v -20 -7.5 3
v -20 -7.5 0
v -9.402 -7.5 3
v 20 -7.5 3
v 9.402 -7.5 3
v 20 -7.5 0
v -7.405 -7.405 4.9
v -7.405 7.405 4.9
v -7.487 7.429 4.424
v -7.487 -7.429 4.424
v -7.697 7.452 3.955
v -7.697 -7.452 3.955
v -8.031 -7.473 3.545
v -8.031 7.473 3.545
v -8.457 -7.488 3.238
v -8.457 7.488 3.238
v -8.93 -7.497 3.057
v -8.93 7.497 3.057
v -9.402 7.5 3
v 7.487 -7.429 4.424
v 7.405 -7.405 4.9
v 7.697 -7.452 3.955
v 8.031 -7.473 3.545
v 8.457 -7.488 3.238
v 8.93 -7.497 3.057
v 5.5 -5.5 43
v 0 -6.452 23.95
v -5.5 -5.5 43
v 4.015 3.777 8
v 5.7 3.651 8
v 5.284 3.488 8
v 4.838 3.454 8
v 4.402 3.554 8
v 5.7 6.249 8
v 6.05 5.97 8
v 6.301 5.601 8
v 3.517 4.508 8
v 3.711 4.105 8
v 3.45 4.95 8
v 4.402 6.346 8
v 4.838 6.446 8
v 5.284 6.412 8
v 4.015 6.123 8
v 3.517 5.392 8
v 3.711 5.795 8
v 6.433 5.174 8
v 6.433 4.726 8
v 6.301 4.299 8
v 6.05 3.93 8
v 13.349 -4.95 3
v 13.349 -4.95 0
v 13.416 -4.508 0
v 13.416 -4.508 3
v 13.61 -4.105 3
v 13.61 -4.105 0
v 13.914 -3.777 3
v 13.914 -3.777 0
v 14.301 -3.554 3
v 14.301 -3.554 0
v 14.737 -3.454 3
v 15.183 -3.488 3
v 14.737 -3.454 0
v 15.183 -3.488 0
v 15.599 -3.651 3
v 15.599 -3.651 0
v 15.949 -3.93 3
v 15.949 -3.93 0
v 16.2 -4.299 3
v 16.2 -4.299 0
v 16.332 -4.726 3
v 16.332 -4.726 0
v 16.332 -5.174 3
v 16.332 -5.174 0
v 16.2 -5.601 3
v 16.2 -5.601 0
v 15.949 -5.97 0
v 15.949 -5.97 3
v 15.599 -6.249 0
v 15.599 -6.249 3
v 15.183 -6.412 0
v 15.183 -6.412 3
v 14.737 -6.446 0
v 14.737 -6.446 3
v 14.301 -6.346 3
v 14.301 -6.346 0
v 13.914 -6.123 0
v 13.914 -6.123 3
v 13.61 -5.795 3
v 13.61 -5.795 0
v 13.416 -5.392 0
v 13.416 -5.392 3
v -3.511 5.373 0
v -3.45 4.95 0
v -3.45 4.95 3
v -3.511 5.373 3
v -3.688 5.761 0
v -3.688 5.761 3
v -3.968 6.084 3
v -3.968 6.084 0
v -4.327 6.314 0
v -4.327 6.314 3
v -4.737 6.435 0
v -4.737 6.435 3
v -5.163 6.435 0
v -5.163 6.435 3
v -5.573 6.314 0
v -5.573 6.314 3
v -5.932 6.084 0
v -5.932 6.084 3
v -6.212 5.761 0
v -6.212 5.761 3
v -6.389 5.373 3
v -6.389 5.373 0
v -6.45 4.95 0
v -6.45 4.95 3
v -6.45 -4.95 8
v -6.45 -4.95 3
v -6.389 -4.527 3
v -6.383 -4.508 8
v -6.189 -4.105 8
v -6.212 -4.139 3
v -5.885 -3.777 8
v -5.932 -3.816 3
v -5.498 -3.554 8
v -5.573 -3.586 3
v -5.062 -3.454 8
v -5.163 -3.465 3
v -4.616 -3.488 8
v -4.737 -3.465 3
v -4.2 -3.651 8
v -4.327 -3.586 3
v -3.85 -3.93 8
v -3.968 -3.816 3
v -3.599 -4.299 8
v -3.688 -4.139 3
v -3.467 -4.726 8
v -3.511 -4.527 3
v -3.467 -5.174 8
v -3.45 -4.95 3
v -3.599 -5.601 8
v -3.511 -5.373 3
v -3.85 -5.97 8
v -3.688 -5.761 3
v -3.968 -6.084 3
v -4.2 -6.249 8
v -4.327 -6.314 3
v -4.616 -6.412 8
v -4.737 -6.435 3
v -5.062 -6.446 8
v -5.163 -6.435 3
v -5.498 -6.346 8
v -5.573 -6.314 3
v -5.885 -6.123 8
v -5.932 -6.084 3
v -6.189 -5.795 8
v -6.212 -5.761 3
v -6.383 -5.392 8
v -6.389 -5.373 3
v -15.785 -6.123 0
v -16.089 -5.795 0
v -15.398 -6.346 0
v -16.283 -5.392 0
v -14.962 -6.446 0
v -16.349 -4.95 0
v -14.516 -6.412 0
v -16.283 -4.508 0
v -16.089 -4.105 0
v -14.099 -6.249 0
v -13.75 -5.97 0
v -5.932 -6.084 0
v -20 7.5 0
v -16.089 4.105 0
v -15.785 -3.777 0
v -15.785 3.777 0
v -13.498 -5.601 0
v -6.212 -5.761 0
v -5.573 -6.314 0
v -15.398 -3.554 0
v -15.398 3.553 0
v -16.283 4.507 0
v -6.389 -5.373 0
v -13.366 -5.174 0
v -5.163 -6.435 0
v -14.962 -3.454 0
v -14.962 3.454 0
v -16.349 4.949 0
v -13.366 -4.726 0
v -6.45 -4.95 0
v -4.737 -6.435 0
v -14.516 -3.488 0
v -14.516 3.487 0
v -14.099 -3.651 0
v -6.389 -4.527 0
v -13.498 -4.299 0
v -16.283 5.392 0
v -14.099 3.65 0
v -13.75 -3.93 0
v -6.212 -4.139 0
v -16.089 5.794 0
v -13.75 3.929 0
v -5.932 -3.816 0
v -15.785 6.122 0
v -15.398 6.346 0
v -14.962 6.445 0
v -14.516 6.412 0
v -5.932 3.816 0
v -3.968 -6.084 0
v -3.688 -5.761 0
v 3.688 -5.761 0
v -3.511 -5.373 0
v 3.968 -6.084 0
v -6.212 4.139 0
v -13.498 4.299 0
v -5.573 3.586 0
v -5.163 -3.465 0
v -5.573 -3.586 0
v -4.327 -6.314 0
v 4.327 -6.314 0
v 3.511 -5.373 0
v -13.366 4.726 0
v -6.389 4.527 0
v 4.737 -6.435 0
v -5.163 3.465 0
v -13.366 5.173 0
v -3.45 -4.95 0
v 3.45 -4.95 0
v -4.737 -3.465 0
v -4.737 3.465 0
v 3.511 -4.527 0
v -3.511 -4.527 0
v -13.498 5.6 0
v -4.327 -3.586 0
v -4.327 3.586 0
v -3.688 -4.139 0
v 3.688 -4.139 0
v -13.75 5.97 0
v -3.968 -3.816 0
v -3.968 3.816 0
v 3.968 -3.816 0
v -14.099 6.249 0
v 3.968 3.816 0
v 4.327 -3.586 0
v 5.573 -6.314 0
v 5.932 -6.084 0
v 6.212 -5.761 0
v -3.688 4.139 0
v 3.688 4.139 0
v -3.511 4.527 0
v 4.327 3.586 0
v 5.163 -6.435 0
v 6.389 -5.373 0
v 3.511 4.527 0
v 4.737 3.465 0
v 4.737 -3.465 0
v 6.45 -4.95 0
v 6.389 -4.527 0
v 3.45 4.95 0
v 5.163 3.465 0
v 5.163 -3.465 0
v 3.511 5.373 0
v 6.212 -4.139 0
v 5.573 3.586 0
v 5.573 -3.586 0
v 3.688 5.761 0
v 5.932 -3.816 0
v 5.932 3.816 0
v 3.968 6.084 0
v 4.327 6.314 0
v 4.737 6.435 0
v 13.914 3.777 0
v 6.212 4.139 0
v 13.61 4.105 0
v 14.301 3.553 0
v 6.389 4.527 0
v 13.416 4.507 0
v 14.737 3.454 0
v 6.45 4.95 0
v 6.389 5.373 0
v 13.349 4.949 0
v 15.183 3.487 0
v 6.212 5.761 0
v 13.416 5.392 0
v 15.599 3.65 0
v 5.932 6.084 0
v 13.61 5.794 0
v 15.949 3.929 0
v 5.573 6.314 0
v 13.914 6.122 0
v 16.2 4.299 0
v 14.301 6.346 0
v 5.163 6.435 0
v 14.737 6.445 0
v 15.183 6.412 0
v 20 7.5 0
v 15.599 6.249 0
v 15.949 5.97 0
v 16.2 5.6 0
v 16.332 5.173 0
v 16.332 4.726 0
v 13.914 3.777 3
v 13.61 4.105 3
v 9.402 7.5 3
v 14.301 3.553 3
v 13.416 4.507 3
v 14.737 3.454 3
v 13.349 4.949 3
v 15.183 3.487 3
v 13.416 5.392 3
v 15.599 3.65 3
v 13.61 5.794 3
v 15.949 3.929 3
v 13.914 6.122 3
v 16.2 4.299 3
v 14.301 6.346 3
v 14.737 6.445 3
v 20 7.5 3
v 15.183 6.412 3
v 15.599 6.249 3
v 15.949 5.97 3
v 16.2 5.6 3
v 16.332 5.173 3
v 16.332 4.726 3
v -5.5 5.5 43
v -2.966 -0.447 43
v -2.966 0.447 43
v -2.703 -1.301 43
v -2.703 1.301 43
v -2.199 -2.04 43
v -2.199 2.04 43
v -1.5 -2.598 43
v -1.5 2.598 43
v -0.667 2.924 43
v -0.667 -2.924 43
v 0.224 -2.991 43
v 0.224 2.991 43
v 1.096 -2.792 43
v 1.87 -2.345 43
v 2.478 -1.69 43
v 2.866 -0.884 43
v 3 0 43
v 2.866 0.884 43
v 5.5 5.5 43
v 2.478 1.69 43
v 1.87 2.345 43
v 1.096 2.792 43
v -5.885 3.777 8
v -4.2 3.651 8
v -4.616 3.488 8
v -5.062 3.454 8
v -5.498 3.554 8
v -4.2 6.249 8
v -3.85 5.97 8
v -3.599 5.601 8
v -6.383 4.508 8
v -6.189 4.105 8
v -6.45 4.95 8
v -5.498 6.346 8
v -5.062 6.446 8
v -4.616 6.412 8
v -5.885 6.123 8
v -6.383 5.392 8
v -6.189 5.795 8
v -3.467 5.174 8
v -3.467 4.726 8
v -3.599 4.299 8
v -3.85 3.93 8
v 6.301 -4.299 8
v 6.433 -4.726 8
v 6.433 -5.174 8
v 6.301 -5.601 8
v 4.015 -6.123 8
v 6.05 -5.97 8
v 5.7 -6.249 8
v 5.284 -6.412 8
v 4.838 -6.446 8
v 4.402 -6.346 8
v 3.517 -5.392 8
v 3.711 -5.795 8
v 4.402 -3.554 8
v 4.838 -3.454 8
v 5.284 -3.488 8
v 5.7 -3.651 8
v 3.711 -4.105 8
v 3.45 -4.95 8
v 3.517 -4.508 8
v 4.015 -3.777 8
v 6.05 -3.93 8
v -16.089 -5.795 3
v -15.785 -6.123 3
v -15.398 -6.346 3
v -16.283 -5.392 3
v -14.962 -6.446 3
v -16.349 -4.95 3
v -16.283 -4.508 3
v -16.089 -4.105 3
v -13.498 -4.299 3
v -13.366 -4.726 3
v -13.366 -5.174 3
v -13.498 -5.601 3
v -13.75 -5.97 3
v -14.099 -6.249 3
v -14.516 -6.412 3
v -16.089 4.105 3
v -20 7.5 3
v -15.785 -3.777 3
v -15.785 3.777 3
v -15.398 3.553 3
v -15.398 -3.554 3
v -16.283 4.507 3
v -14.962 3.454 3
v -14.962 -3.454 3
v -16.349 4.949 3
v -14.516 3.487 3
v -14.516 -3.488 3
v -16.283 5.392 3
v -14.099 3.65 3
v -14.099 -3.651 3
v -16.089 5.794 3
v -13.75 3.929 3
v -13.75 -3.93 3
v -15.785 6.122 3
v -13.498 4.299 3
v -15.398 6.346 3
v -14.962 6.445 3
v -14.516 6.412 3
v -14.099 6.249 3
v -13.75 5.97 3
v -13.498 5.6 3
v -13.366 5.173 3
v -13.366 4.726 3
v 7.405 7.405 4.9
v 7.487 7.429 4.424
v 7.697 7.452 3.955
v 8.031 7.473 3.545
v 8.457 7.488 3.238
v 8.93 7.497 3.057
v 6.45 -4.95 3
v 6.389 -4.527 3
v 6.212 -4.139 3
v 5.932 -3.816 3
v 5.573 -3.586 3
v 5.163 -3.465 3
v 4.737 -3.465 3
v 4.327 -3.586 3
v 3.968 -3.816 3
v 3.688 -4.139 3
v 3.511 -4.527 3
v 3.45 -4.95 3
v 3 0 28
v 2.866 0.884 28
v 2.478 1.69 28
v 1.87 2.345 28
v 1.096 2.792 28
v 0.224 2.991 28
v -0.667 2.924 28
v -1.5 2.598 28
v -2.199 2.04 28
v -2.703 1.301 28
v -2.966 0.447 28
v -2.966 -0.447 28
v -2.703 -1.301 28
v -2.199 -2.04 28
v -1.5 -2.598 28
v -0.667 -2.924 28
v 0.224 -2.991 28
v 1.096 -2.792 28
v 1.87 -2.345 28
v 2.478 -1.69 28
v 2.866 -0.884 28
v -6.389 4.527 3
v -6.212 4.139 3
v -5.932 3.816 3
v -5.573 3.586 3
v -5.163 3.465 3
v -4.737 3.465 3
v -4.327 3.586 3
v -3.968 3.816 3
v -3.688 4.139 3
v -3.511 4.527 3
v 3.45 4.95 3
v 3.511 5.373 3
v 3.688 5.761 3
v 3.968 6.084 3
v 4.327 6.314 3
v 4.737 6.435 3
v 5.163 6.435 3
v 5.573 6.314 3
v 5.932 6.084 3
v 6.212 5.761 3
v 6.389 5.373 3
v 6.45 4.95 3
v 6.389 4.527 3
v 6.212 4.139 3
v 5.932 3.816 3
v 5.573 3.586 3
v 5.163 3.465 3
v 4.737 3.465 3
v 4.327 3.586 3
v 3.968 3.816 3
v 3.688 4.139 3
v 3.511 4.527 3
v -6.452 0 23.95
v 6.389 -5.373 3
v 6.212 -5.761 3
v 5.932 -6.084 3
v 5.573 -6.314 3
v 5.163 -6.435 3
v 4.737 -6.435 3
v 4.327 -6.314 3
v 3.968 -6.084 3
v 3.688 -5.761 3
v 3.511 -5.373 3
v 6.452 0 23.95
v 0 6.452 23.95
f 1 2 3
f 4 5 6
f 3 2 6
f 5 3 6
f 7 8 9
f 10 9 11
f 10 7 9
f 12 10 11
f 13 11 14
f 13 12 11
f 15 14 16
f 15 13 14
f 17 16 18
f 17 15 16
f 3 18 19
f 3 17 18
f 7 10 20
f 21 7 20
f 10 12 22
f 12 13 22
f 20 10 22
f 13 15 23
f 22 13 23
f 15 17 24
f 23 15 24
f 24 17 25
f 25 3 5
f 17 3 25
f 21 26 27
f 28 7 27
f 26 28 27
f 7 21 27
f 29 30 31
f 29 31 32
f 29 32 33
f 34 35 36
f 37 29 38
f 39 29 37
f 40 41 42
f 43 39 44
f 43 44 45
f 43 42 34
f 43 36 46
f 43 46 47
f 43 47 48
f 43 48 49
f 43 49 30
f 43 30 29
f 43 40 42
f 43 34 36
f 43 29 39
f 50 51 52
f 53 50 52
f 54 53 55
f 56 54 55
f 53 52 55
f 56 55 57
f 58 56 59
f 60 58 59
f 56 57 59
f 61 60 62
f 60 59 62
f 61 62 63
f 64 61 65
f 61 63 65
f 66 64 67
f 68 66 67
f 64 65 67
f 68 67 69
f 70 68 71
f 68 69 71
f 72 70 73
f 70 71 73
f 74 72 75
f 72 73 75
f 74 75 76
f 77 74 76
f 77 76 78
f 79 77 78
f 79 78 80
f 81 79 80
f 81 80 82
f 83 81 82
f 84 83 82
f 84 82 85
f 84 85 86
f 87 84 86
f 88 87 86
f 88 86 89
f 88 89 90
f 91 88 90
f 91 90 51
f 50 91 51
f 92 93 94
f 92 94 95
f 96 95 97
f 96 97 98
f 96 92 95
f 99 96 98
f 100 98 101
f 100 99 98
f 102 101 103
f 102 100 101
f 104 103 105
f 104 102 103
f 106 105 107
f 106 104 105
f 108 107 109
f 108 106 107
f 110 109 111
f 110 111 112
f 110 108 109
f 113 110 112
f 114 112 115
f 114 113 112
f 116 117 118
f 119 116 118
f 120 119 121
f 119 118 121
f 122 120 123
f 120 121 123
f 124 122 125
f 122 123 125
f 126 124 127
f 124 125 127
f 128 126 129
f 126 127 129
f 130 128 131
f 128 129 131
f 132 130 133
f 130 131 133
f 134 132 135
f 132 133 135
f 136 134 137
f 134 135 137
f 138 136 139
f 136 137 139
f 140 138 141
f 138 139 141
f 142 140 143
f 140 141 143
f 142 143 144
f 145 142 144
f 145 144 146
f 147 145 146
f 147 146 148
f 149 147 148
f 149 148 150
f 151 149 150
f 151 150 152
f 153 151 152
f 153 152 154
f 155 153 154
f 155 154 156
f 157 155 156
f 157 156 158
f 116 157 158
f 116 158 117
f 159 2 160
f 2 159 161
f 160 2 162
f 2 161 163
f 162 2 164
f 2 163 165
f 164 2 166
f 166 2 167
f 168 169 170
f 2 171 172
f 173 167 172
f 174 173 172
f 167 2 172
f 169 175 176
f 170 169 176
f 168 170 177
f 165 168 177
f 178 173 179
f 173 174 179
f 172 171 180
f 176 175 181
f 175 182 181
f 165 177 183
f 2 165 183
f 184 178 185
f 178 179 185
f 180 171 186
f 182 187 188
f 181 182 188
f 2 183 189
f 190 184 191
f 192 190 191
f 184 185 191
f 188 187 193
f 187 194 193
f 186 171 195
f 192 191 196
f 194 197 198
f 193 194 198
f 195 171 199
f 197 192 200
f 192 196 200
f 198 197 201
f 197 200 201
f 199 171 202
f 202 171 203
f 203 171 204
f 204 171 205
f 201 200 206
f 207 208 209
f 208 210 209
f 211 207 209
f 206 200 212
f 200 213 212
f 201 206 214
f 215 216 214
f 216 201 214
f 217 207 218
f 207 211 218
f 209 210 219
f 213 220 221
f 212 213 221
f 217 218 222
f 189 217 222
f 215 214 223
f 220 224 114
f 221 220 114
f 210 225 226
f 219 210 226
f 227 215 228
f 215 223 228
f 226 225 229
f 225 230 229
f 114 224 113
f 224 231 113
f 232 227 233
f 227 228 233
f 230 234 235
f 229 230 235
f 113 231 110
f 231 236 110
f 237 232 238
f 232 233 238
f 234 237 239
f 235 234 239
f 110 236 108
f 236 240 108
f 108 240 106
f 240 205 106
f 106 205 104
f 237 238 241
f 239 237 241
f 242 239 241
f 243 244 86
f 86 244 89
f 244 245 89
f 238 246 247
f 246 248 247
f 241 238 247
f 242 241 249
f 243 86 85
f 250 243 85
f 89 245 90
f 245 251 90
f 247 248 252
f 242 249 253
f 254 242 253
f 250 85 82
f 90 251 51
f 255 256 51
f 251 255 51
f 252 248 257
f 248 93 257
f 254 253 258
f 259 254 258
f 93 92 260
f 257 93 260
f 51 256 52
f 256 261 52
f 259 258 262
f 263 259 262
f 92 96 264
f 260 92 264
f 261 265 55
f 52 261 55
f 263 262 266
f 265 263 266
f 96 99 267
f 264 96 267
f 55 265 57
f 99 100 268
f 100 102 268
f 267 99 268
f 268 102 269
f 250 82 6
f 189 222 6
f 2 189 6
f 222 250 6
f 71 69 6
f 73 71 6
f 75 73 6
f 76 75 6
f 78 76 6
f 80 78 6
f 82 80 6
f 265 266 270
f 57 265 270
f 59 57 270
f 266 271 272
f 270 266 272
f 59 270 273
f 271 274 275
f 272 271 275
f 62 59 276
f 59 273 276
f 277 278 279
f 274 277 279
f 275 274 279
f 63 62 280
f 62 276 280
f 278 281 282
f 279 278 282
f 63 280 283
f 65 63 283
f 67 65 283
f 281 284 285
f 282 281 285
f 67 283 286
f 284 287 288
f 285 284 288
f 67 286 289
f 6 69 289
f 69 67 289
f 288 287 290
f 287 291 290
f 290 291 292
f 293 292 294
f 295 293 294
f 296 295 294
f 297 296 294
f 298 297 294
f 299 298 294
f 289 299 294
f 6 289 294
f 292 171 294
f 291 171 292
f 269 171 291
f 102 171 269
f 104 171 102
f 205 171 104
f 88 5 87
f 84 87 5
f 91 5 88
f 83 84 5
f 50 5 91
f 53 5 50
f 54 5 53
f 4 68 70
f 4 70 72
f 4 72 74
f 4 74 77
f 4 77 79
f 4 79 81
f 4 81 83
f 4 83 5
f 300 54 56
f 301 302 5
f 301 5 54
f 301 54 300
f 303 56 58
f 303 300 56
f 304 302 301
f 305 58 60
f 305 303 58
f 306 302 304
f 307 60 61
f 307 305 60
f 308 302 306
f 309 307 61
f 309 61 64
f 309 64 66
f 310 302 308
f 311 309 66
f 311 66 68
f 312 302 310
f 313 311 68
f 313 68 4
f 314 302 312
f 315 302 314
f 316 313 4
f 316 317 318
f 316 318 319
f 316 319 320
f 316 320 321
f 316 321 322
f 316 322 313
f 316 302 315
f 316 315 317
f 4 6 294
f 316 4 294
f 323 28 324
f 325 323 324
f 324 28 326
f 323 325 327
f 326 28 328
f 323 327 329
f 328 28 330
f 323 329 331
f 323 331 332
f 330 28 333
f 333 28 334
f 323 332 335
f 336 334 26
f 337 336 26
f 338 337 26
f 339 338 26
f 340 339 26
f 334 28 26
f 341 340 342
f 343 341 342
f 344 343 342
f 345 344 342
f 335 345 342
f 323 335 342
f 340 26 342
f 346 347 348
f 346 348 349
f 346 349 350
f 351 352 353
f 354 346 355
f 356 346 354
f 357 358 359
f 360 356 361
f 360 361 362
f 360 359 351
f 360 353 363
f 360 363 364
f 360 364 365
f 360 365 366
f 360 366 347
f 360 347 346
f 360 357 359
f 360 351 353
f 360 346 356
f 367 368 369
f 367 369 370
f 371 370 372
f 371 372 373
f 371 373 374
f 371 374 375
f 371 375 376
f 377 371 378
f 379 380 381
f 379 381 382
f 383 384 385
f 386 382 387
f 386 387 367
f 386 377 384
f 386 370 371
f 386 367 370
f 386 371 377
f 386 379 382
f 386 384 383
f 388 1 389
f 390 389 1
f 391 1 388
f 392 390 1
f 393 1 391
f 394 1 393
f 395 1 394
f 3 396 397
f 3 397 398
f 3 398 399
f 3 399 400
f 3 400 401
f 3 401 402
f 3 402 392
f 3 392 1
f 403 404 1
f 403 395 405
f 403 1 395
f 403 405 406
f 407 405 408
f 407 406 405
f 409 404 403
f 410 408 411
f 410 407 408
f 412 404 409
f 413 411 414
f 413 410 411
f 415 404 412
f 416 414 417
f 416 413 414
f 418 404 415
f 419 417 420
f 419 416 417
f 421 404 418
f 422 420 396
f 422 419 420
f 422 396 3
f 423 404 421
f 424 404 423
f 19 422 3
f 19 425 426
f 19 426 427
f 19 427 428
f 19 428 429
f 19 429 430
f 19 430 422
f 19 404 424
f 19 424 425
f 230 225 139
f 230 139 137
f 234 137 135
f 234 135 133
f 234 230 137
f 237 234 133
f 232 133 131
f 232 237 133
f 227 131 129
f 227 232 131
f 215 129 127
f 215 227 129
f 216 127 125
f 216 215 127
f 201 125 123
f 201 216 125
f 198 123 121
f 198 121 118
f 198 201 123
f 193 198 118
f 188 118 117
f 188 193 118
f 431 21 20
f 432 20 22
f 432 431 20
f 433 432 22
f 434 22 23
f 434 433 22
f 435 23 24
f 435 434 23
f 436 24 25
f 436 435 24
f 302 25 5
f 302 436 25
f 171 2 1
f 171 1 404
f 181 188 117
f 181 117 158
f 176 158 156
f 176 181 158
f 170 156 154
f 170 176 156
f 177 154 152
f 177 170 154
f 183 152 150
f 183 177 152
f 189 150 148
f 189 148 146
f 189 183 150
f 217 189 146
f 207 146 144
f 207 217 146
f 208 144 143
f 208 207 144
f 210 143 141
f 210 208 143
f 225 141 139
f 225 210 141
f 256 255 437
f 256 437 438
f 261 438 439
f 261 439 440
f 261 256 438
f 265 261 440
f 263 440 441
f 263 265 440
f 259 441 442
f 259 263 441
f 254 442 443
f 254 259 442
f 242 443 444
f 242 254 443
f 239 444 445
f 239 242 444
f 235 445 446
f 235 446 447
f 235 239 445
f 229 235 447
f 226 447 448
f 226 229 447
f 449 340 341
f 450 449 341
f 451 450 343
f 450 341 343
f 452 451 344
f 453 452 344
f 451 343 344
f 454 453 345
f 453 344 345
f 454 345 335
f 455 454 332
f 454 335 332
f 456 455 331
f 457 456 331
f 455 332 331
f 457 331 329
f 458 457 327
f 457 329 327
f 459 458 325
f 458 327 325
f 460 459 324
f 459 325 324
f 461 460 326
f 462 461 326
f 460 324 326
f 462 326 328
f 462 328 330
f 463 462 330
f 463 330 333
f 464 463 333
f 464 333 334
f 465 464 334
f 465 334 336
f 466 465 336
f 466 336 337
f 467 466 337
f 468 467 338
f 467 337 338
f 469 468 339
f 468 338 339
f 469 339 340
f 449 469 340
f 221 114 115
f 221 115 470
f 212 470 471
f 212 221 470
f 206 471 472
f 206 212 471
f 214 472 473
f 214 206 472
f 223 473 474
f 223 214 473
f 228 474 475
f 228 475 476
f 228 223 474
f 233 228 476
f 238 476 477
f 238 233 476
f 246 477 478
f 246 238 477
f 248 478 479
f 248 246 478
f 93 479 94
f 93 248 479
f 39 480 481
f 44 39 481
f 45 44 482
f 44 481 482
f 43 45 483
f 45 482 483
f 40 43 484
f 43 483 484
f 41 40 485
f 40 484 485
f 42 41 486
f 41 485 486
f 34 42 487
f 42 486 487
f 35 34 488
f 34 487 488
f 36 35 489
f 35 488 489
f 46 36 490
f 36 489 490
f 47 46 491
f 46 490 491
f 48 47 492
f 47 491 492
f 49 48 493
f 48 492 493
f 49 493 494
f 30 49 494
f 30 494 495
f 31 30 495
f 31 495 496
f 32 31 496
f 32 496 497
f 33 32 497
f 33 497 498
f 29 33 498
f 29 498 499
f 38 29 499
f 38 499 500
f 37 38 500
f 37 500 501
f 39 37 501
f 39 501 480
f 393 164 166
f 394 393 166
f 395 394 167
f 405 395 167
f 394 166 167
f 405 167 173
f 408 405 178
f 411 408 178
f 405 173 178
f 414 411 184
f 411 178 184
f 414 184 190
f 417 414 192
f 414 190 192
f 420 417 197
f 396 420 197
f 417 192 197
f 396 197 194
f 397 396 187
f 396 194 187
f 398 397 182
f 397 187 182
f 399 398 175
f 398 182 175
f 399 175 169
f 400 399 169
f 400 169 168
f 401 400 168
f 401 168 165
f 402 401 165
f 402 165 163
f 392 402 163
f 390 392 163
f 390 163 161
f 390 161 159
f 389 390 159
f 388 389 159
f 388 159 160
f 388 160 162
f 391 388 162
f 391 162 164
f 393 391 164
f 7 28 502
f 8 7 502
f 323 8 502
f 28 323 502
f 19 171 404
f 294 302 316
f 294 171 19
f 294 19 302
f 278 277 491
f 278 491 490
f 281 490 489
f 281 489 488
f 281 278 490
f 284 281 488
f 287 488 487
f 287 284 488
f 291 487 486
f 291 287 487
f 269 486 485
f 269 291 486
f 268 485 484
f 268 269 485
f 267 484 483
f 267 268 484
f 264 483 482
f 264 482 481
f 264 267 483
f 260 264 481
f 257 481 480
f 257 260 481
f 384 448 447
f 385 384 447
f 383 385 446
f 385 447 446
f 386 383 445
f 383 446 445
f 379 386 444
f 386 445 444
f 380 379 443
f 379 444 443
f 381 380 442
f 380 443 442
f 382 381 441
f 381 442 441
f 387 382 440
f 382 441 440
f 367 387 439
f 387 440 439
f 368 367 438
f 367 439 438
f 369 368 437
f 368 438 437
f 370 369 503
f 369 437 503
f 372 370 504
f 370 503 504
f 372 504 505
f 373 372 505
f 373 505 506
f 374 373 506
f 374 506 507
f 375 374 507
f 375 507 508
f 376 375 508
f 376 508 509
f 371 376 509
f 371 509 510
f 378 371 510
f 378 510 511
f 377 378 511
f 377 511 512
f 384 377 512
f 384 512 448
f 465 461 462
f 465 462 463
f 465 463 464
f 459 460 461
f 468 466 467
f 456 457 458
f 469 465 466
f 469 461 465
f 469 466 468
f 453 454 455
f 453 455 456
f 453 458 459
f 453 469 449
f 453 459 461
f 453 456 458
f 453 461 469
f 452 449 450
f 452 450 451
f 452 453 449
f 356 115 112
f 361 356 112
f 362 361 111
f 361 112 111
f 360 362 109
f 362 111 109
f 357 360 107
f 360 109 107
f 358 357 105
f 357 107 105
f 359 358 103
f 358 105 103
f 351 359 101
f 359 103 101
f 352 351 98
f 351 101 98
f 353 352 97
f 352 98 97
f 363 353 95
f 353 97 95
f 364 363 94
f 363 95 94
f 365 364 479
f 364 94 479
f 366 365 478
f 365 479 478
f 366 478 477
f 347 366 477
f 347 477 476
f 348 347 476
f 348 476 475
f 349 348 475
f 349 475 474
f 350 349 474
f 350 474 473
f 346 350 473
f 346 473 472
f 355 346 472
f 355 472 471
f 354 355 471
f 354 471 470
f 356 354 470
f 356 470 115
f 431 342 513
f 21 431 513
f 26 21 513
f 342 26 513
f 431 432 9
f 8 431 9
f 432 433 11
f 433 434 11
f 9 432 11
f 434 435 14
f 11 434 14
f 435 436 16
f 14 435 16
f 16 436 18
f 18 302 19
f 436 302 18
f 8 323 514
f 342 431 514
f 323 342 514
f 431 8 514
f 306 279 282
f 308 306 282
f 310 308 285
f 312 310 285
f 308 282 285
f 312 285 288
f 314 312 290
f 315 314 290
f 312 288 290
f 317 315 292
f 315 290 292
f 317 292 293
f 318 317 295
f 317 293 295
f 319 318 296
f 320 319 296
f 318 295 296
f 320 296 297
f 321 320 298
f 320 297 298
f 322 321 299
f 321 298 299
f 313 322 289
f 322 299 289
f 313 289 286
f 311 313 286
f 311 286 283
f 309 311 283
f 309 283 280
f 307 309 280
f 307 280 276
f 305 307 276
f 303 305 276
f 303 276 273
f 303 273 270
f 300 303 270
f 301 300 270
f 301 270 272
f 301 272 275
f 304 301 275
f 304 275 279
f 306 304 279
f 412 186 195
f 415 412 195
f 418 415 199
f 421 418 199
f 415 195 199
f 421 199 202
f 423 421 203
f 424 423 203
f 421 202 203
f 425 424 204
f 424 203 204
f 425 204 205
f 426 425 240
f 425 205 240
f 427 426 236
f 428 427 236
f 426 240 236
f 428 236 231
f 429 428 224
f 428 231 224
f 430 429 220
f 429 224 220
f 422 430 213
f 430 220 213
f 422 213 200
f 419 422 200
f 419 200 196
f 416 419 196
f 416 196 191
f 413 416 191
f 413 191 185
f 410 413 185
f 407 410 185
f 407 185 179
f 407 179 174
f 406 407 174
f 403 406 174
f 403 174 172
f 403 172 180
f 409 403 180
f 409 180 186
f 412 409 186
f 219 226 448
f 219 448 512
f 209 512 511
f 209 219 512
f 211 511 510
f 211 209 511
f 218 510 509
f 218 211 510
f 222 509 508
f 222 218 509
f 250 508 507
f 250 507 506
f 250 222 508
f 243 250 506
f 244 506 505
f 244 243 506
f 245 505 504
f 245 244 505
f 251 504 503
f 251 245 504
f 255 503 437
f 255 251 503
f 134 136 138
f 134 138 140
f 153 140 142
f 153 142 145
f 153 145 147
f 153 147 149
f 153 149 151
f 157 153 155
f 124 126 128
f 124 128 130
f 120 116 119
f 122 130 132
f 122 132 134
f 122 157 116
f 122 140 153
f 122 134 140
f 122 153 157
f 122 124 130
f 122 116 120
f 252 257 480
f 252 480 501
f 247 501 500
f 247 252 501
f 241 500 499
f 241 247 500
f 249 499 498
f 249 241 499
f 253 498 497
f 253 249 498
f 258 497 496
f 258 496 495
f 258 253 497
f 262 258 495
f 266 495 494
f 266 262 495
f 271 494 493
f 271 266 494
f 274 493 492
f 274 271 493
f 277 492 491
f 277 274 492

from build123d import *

# Parameters (mm, degrees)
SKETCH_1_W          = 40
SKETCH_1_H          = 15
SKETCH_1_R          = 1.5
EXTRUDE_1_DEPTH     = 3
SKETCH_5_R          = 1.5
CUT_EXTRUDE_3_DEPTH = 8
SKETCH_8_R          = 2.999642866
CUT_EXTRUDE_4_DEPTH = 15
SKETCH_9_R          = 1.5
CUT_EXTRUDE_5_DEPTH = 15
FILLET_1_R          = 2


with BuildPart() as part:
    # 草图1 → 凸台-拉伸1 (new body)
    with BuildSketch(Plane.XY):
        Rectangle(SKETCH_1_W, SKETCH_1_H)
        with Locations((4.95, 4.95)):
            Circle(SKETCH_1_R, mode=Mode.SUBTRACT)
        with Locations((4.95, -4.95)):
            Circle(SKETCH_1_R, mode=Mode.SUBTRACT)
        with Locations((-4.95, -4.95)):
            Circle(SKETCH_1_R, mode=Mode.SUBTRACT)
        with Locations((-4.95, 4.95)):
            Circle(SKETCH_1_R, mode=Mode.SUBTRACT)
    extrude(amount=EXTRUDE_1_DEPTH)

    # 草图3 → 放样1 section 0
    with BuildSketch(Plane.XY.offset(43)):
        with BuildLine():
            Line((-5.5, -5.5), (5.5, -5.5))
            Line((5.5, -5.5), (5.5, 5.5))
            Line((5.5, 5.5), (-5.5, 5.5))
            Line((-5.5, 5.5), (-5.5, -5.5))
        make_face()
    # 草图2 → 放样1 section 1
    with BuildSketch(Plane.XY.offset(3)):
        with BuildLine():
            Line((-7.5, -7.5), (7.5, -7.5))
            Line((7.5, -7.5), (7.5, 7.5))
            Line((7.5, 7.5), (-7.5, 7.5))
            Line((-7.5, 7.5), (-7.5, -7.5))
        make_face()
    loft()

    # 草图5 → 切除-拉伸3 (cut)
    with BuildSketch(Plane(origin=(0, 0, 0), x_dir=(-1, 0, 0), z_dir=(0, 0, -1))):
        with Locations((4.95, -4.95)):
            Circle(SKETCH_5_R)
        with Locations((4.95, 4.95)):
            Circle(SKETCH_5_R)
        with Locations((-4.95, 4.95)):
            Circle(SKETCH_5_R)
        with Locations((-4.95, -4.95)):
            Circle(SKETCH_5_R)
    extrude(amount=-CUT_EXTRUDE_3_DEPTH, mode=Mode.SUBTRACT)

    # 草图8 → 切除-拉伸4 (cut)
    with BuildSketch(Plane.XY.offset(43)):
        Circle(SKETCH_8_R)
    extrude(amount=-CUT_EXTRUDE_4_DEPTH, mode=Mode.SUBTRACT)

    # 草图9 → 切除-拉伸5 (cut)
    with BuildSketch(Plane(origin=(0, 0, 0), x_dir=(-1, 0, 0), z_dir=(0, 0, -1))):
        with Locations((-14.848989873, -4.95)):
            Circle(SKETCH_9_R)
        with Locations((-14.848989873, 4.949494936)):
            Circle(SKETCH_9_R)
        with Locations((14.849494937, 4.949494936)):
            Circle(SKETCH_9_R)
        with Locations((14.849494937, -4.95)):
            Circle(SKETCH_9_R)
    extrude(amount=-CUT_EXTRUDE_5_DEPTH, mode=Mode.SUBTRACT)

    # 圆角1
    fillet_1_edges = [part.edges().sort_by_distance(p)[0] for p in [
        (7.5, 0, 3),
        (-7.5, 0, 3),
    ]]
    fillet(fillet_1_edges, radius=FILLET_1_R)


solid = part.part
